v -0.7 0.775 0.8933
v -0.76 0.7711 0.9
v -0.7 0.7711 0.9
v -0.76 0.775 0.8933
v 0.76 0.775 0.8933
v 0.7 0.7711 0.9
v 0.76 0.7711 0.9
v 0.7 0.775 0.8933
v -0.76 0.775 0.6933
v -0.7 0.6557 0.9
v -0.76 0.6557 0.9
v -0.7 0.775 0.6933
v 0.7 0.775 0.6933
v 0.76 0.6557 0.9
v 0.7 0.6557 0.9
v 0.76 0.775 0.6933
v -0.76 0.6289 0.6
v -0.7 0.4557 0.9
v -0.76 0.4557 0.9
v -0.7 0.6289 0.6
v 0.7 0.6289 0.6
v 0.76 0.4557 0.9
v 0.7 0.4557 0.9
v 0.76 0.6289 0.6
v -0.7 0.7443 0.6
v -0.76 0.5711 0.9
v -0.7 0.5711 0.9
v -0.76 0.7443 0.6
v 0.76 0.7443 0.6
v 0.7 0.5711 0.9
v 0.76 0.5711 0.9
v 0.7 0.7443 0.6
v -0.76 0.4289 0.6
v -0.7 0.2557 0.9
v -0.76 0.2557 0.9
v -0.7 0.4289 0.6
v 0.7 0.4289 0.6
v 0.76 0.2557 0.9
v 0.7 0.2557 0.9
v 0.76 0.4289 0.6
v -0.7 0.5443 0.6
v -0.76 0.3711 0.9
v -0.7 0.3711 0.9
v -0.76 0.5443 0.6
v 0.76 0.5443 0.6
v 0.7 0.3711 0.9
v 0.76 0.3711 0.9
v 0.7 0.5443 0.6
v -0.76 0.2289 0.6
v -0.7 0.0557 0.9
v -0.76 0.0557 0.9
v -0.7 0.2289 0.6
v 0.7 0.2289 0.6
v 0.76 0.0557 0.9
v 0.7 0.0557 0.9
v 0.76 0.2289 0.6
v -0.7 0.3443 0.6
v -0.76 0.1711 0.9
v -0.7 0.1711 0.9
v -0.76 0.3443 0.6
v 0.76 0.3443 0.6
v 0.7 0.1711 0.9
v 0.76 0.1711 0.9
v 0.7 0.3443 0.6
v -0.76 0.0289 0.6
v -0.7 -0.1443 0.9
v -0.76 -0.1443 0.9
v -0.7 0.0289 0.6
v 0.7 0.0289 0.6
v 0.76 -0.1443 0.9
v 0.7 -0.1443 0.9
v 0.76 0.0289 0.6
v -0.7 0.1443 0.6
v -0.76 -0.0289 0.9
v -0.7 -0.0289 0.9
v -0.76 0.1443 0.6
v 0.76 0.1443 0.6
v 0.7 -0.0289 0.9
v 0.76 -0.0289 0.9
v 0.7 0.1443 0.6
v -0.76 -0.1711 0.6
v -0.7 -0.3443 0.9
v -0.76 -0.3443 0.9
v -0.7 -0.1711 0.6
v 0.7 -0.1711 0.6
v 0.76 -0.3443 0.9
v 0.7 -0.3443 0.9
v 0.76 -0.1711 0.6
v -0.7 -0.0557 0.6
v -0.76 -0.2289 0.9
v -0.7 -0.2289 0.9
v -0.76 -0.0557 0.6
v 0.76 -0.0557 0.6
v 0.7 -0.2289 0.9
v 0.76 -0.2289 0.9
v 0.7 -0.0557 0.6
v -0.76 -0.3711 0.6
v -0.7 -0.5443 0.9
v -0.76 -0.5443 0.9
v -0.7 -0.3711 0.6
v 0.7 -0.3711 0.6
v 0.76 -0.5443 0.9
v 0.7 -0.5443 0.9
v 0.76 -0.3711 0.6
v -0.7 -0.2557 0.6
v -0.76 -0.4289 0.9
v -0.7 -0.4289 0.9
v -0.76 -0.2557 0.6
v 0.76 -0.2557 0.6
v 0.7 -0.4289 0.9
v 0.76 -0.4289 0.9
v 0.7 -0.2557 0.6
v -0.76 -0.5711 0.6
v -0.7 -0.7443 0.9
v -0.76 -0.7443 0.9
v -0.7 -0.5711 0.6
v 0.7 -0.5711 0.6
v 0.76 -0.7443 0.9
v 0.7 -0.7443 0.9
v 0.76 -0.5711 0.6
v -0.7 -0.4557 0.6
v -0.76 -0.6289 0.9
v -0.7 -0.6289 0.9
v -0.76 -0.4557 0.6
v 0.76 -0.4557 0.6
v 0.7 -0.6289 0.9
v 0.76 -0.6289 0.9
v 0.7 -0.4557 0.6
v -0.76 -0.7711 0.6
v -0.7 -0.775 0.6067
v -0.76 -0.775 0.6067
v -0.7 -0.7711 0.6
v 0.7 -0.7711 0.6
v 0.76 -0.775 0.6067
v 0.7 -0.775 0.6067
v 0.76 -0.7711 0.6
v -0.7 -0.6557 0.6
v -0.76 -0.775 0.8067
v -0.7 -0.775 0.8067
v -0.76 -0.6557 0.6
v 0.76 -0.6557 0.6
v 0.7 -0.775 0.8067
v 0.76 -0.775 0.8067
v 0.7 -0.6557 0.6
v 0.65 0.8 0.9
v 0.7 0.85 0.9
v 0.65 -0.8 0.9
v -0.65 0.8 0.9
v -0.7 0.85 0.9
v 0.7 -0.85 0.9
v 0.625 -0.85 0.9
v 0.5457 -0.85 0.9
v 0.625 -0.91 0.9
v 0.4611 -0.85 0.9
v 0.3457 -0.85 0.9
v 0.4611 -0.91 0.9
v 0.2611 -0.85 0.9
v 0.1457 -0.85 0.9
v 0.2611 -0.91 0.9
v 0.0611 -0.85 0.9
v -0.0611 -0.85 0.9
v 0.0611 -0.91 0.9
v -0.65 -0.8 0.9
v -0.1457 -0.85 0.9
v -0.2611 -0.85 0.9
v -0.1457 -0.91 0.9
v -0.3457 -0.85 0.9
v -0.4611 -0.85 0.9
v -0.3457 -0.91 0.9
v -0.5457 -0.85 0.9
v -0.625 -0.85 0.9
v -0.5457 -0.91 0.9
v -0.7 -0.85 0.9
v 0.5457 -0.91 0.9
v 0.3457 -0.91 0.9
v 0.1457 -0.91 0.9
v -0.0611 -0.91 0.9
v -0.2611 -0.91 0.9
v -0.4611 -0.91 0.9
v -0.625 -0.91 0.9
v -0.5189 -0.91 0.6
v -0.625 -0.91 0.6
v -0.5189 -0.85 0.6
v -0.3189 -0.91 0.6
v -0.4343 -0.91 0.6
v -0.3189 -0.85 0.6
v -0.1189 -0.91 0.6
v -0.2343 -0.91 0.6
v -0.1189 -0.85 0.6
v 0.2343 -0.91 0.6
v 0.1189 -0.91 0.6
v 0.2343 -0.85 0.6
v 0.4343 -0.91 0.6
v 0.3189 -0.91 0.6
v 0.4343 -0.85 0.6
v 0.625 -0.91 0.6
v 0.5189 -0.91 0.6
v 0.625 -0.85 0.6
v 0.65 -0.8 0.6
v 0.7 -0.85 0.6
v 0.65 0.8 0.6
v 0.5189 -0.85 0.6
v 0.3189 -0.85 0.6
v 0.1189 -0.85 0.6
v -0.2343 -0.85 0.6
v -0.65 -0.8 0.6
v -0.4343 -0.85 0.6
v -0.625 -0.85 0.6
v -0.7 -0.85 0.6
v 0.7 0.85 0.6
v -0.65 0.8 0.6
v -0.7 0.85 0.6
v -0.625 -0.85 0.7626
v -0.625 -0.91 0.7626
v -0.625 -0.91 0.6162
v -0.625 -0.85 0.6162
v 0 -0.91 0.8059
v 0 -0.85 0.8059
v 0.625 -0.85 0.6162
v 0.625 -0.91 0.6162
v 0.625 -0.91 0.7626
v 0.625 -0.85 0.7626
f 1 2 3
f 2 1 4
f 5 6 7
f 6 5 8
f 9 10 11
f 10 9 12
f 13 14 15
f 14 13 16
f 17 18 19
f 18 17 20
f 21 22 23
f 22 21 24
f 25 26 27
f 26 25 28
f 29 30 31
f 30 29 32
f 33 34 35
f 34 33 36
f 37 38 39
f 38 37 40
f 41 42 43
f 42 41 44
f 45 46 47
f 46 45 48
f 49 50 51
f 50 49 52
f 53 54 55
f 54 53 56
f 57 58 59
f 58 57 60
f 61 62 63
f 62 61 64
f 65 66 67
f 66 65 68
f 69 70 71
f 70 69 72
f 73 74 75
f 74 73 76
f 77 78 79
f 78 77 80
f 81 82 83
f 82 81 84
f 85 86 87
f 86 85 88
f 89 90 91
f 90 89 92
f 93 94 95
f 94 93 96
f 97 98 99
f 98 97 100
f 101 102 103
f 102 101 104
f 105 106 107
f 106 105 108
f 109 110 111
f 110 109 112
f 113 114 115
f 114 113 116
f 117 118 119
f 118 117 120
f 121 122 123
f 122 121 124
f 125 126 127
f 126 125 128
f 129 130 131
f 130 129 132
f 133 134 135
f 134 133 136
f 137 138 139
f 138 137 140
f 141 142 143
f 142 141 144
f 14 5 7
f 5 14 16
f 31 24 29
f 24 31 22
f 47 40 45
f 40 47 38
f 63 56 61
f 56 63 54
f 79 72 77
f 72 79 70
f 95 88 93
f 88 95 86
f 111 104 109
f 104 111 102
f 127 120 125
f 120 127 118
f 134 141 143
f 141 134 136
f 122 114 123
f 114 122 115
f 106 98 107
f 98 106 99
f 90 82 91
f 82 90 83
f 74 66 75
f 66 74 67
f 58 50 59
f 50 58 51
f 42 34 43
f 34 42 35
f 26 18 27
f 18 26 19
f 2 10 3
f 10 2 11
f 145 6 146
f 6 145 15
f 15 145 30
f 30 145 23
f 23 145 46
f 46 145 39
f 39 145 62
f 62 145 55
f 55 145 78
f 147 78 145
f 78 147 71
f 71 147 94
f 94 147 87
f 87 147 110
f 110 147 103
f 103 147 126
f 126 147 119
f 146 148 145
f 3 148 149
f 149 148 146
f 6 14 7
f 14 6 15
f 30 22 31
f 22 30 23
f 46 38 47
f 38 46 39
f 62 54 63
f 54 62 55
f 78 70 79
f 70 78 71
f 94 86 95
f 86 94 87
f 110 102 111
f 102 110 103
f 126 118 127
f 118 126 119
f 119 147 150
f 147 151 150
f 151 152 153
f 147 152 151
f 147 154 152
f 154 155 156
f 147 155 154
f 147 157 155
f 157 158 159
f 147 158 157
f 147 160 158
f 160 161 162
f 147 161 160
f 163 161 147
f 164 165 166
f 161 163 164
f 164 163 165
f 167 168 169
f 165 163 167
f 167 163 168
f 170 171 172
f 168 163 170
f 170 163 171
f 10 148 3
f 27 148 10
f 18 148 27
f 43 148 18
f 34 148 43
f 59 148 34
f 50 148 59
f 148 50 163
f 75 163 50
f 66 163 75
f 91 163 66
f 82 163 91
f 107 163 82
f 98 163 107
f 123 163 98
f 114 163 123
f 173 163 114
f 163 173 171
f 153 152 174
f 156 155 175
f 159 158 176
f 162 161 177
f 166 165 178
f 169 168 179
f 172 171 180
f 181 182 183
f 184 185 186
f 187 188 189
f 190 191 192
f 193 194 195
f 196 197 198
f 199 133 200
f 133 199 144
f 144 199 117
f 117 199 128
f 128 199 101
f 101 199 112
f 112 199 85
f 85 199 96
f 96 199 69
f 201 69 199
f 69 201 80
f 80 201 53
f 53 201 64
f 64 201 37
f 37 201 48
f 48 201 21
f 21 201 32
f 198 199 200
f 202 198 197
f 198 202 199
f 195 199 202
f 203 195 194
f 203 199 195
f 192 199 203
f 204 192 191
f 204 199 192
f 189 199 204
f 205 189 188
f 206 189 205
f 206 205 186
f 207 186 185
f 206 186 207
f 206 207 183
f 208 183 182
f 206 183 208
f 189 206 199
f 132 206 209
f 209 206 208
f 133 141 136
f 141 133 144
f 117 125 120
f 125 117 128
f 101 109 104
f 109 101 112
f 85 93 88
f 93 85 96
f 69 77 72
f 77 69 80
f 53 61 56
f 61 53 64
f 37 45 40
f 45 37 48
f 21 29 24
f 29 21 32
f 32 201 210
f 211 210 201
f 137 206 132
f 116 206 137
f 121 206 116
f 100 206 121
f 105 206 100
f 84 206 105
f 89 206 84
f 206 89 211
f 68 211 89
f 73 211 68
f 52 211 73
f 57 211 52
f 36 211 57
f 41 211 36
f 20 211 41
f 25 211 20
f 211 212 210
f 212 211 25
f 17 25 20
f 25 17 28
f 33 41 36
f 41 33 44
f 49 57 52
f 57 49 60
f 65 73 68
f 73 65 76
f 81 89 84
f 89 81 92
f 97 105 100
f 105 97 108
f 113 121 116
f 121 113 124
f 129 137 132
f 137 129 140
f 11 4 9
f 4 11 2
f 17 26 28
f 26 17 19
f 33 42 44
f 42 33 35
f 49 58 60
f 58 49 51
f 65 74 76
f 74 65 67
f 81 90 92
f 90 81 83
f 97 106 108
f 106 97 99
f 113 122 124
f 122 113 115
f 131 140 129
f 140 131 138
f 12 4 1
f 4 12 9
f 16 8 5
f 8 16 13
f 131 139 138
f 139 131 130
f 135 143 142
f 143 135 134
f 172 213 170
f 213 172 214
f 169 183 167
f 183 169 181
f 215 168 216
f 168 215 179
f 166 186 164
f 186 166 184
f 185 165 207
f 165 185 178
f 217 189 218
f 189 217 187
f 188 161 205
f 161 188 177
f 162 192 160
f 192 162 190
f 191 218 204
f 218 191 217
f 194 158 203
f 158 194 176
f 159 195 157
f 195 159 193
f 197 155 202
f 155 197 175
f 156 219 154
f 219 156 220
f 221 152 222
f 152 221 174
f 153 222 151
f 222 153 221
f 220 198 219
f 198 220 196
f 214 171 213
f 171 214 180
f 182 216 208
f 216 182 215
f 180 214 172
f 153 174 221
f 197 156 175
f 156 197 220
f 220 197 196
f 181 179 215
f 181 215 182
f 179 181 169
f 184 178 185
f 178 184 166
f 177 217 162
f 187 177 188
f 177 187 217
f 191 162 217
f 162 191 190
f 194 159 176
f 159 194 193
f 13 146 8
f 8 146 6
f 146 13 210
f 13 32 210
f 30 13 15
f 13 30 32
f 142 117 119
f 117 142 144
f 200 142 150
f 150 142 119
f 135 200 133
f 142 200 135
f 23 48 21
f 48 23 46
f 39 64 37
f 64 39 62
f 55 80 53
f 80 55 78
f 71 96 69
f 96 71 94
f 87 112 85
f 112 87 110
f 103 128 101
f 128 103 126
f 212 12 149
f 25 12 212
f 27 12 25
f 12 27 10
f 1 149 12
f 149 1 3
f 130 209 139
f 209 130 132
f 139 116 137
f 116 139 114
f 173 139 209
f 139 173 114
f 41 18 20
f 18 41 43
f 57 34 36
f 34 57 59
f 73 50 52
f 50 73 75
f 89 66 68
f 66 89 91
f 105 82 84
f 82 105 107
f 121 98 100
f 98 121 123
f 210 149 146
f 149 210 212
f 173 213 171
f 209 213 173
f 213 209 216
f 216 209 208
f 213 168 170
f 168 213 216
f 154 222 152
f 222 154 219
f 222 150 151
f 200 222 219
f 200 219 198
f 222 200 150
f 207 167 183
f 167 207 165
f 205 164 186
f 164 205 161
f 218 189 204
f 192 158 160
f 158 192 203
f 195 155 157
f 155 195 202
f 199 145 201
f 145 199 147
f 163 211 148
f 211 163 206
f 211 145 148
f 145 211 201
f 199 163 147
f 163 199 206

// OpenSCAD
use <lib.scad>

hd = 24;
ld = 12;

module wheel() {
	rotate([0,90,0]) cyl(0.25, 0.25, 0.35);
}

module wheelHD() {
	wheel($fn=hd);
}

module wheelLD() {
	wheel($fn=ld);
}

module wheels() {
	translate([0.6,0.6,0.25]) wheel();
	translate([0.6,-0.6,0.25]) wheel();
	translate([-0.6,-0.6,0.25]) wheel();
	translate([-0.6,0.6,0.25]) wheel();
}

module cabHD() {
	translate([0,0.55,0.85]) difference() {
		rbox([1.1, 0.9, 0.5], 0.05, $fn=8);
		cyl(0.3, 0.3, 1.0, $fn=16);
	}
}

module cabLD() {
	translate([0,0.55,0.85]) difference() {
		box([1.1, 0.9, 0.5]);
		cyl(0.3, 0.3, 1.0, $fn=8);
	}
}

module chassisHaulerHD() {
	translate([0,0,0.6], $fn=hd) difference() {
		union() {
			rbox([1.5, 1.8, 0.8], 0.05, $fn=8);
			translate([0,0.55,0.25]) cyl(0.3, 0.3, 0.5, $fn=16);
		}
		translate([0,-0.35,0.35]) rbox([1.1, 0.8, 0.5], 0.05, $fn=8);
		translate([0.6,0.6,-0.35]) scale([1.1,1.1,1.1]) wheel();
		translate([0.6,-0.6,-0.35]) scale([1.1,1.1,1.1]) wheel();
		translate([-0.6,-0.6,-0.35]) scale([1.1,1.1,1.1]) wheel();
		translate([-0.6,0.6,-0.35]) scale([1.1,1.1,1.1]) wheel();
	};
}

module chassisHaulerLD() {
	translate([0,0,0.6], $fn=ld) difference() {
		union() {
			box([1.5, 1.8, 0.8]);
			translate([0,0.55,0.25]) cyl(0.3, 0.3, 0.5, $fn=8);
		}
		translate([0,-0.35,0.35]) box([1.1, 0.8, 0.5]);
		translate([0.6,0.6,-0.35]) scale([1.1,1.1,1.1]) wheel();
		translate([0.6,-0.6,-0.35]) scale([1.1,1.1,1.1]) wheel();
		translate([-0.6,-0.6,-0.35]) scale([1.1,1.1,1.1]) wheel();
		translate([-0.6,0.6,-0.35]) scale([1.1,1.1,1.1]) wheel();
	};
}

module chassisEngineerHD() {
	translate([0,0,0.6], $fn=hd) difference() {
		union() {
			rbox([1.5, 1.8, 0.8], 0.05, $fn=8);
			translate([0,0.55,0.25]) cyl(0.3, 0.3, 0.5, $fn=16);
		}
		translate([0.6,0.6,-0.35]) scale([1.1,1.1,1.1]) wheel();
		translate([0.6,-0.6,-0.35]) scale([1.1,1.1,1.1]) wheel();
		translate([-0.6,-0.6,-0.35]) scale([1.1,1.1,1.1]) wheel();
		translate([-0.6,0.6,-0.35]) scale([1.1,1.1,1.1]) wheel();
	};
}

module chassisEngineerLD() {
	translate([0,0,0.6], $fn=ld) difference() {
		union() {
			box([1.5, 1.8, 0.8]);
			translate([0,0.55,0.25]) cyl(0.3, 0.3, 0.5, $fn=8);
		}
		translate([0.6,0.6,-0.35]) scale([1.1,1.1,1.1]) wheel();
		translate([0.6,-0.6,-0.35]) scale([1.1,1.1,1.1]) wheel();
		translate([-0.6,-0.6,-0.35]) scale([1.1,1.1,1.1]) wheel();
		translate([-0.6,0.6,-0.35]) scale([1.1,1.1,1.1]) wheel();
	};
}

module engineerStripeHD() {
	difference() {
		union() {
			translate([0,0,0.75]) box([1.4,1.7,0.3]);
			intersection() {
				translate([0,0,0.75]) box([1.52,1.55,0.3]);
				for (y = [1:-0.2:-1]) translate([0,y,0.75]) rotate([30,0,0]) box([2,0.1,0.5]);
			}
			intersection() {
				translate([0,-0.1,0.75]) box([1.25,1.62,0.3]);
				union() {
					for (x = [-0.69:0.2:0]) translate([x,0,0.75]) rotate([0,30,0]) box([0.1,2,0.5]);
					for (x = [0.09:0.2:0.78]) translate([x,0,0.75]) rotate([0,-30,0]) box([0.1,2,0.5]);
				}
			}
		}
		translate([0,0,0.75]) box([1.3,1.6,1]);
	}
}

module engineerStripeLD() {
	difference() {
		union() {
			translate([0,0,0.75]) box([1.4,1.7,0.3]);
			intersection() {
				translate([0,0,0.75]) box([1.52,1.55,0.3]);
				for (y = [1:-0.4:-1]) translate([0,y,0.75]) rotate([30,0,0]) box([2,0.2,0.5]);
			}
			intersection() {
				translate([0,-0.1,0.75]) box([1.25,1.62,0.3]);
				union() {
					for (x = [-0.5:0.4:0]) translate([x,0,0.75]) rotate([0,30,0]) box([0.2,2,0.5]);
					for (x = [0.1:0.4:0.68]) translate([x,0,0.75]) rotate([0,-30,0]) box([0.2,2,0.5]);
				}
			}
		}
		translate([0,0,0.75]) box([1.3,1.6,1]);
	}
}

//chassisEngineerHD();
//chassisEngineerLD();
engineerStripeHD();
//engineerStripeLD();
//chassisHaulerHD();
//chassisHaulerLD();
//cabHD();
//cabLD();
//wheelHD();
//wheelLD();
